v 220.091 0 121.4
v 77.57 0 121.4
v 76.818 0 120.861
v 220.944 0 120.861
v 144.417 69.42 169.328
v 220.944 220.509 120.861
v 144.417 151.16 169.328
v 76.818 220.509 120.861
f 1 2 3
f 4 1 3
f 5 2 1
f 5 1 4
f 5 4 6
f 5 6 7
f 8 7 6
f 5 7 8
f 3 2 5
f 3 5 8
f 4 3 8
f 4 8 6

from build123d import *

# Parameters (mm, degrees)
F1_DEPTH = 221.488
F3_DEPTH = 383.794
F5_DEPTH = 385.064


with BuildPart() as f1:
    # F0 (on Front) → F1 (new body)
    with BuildSketch(Plane.XZ):
        Polygon((144.416556, 169.327736), (76.817557, 120.860532), (220.943704, 120.860532), align=None)
    extrude(amount=-F1_DEPTH)

    # F2 (on Right) → F3 (cut)
    with BuildSketch(Plane.YZ):
        Polygon((-13.188886, 115.596727), (0, 121.400371), (78.753106, 175.771385), (-13.188886, 175.771385), align=None)
    extrude(amount=F3_DEPTH, mode=Mode.SUBTRACT)

    # F4 (on Right) → F5 (cut)
    with BuildSketch(Plane.YZ):
        Polygon((141.06594, 176.382303), (223.233372, 118.956745), (241.255224, 92.687599), (241.255224, 179.131404), align=None)
    extrude(amount=F5_DEPTH, mode=Mode.SUBTRACT)


solid = f1.part
